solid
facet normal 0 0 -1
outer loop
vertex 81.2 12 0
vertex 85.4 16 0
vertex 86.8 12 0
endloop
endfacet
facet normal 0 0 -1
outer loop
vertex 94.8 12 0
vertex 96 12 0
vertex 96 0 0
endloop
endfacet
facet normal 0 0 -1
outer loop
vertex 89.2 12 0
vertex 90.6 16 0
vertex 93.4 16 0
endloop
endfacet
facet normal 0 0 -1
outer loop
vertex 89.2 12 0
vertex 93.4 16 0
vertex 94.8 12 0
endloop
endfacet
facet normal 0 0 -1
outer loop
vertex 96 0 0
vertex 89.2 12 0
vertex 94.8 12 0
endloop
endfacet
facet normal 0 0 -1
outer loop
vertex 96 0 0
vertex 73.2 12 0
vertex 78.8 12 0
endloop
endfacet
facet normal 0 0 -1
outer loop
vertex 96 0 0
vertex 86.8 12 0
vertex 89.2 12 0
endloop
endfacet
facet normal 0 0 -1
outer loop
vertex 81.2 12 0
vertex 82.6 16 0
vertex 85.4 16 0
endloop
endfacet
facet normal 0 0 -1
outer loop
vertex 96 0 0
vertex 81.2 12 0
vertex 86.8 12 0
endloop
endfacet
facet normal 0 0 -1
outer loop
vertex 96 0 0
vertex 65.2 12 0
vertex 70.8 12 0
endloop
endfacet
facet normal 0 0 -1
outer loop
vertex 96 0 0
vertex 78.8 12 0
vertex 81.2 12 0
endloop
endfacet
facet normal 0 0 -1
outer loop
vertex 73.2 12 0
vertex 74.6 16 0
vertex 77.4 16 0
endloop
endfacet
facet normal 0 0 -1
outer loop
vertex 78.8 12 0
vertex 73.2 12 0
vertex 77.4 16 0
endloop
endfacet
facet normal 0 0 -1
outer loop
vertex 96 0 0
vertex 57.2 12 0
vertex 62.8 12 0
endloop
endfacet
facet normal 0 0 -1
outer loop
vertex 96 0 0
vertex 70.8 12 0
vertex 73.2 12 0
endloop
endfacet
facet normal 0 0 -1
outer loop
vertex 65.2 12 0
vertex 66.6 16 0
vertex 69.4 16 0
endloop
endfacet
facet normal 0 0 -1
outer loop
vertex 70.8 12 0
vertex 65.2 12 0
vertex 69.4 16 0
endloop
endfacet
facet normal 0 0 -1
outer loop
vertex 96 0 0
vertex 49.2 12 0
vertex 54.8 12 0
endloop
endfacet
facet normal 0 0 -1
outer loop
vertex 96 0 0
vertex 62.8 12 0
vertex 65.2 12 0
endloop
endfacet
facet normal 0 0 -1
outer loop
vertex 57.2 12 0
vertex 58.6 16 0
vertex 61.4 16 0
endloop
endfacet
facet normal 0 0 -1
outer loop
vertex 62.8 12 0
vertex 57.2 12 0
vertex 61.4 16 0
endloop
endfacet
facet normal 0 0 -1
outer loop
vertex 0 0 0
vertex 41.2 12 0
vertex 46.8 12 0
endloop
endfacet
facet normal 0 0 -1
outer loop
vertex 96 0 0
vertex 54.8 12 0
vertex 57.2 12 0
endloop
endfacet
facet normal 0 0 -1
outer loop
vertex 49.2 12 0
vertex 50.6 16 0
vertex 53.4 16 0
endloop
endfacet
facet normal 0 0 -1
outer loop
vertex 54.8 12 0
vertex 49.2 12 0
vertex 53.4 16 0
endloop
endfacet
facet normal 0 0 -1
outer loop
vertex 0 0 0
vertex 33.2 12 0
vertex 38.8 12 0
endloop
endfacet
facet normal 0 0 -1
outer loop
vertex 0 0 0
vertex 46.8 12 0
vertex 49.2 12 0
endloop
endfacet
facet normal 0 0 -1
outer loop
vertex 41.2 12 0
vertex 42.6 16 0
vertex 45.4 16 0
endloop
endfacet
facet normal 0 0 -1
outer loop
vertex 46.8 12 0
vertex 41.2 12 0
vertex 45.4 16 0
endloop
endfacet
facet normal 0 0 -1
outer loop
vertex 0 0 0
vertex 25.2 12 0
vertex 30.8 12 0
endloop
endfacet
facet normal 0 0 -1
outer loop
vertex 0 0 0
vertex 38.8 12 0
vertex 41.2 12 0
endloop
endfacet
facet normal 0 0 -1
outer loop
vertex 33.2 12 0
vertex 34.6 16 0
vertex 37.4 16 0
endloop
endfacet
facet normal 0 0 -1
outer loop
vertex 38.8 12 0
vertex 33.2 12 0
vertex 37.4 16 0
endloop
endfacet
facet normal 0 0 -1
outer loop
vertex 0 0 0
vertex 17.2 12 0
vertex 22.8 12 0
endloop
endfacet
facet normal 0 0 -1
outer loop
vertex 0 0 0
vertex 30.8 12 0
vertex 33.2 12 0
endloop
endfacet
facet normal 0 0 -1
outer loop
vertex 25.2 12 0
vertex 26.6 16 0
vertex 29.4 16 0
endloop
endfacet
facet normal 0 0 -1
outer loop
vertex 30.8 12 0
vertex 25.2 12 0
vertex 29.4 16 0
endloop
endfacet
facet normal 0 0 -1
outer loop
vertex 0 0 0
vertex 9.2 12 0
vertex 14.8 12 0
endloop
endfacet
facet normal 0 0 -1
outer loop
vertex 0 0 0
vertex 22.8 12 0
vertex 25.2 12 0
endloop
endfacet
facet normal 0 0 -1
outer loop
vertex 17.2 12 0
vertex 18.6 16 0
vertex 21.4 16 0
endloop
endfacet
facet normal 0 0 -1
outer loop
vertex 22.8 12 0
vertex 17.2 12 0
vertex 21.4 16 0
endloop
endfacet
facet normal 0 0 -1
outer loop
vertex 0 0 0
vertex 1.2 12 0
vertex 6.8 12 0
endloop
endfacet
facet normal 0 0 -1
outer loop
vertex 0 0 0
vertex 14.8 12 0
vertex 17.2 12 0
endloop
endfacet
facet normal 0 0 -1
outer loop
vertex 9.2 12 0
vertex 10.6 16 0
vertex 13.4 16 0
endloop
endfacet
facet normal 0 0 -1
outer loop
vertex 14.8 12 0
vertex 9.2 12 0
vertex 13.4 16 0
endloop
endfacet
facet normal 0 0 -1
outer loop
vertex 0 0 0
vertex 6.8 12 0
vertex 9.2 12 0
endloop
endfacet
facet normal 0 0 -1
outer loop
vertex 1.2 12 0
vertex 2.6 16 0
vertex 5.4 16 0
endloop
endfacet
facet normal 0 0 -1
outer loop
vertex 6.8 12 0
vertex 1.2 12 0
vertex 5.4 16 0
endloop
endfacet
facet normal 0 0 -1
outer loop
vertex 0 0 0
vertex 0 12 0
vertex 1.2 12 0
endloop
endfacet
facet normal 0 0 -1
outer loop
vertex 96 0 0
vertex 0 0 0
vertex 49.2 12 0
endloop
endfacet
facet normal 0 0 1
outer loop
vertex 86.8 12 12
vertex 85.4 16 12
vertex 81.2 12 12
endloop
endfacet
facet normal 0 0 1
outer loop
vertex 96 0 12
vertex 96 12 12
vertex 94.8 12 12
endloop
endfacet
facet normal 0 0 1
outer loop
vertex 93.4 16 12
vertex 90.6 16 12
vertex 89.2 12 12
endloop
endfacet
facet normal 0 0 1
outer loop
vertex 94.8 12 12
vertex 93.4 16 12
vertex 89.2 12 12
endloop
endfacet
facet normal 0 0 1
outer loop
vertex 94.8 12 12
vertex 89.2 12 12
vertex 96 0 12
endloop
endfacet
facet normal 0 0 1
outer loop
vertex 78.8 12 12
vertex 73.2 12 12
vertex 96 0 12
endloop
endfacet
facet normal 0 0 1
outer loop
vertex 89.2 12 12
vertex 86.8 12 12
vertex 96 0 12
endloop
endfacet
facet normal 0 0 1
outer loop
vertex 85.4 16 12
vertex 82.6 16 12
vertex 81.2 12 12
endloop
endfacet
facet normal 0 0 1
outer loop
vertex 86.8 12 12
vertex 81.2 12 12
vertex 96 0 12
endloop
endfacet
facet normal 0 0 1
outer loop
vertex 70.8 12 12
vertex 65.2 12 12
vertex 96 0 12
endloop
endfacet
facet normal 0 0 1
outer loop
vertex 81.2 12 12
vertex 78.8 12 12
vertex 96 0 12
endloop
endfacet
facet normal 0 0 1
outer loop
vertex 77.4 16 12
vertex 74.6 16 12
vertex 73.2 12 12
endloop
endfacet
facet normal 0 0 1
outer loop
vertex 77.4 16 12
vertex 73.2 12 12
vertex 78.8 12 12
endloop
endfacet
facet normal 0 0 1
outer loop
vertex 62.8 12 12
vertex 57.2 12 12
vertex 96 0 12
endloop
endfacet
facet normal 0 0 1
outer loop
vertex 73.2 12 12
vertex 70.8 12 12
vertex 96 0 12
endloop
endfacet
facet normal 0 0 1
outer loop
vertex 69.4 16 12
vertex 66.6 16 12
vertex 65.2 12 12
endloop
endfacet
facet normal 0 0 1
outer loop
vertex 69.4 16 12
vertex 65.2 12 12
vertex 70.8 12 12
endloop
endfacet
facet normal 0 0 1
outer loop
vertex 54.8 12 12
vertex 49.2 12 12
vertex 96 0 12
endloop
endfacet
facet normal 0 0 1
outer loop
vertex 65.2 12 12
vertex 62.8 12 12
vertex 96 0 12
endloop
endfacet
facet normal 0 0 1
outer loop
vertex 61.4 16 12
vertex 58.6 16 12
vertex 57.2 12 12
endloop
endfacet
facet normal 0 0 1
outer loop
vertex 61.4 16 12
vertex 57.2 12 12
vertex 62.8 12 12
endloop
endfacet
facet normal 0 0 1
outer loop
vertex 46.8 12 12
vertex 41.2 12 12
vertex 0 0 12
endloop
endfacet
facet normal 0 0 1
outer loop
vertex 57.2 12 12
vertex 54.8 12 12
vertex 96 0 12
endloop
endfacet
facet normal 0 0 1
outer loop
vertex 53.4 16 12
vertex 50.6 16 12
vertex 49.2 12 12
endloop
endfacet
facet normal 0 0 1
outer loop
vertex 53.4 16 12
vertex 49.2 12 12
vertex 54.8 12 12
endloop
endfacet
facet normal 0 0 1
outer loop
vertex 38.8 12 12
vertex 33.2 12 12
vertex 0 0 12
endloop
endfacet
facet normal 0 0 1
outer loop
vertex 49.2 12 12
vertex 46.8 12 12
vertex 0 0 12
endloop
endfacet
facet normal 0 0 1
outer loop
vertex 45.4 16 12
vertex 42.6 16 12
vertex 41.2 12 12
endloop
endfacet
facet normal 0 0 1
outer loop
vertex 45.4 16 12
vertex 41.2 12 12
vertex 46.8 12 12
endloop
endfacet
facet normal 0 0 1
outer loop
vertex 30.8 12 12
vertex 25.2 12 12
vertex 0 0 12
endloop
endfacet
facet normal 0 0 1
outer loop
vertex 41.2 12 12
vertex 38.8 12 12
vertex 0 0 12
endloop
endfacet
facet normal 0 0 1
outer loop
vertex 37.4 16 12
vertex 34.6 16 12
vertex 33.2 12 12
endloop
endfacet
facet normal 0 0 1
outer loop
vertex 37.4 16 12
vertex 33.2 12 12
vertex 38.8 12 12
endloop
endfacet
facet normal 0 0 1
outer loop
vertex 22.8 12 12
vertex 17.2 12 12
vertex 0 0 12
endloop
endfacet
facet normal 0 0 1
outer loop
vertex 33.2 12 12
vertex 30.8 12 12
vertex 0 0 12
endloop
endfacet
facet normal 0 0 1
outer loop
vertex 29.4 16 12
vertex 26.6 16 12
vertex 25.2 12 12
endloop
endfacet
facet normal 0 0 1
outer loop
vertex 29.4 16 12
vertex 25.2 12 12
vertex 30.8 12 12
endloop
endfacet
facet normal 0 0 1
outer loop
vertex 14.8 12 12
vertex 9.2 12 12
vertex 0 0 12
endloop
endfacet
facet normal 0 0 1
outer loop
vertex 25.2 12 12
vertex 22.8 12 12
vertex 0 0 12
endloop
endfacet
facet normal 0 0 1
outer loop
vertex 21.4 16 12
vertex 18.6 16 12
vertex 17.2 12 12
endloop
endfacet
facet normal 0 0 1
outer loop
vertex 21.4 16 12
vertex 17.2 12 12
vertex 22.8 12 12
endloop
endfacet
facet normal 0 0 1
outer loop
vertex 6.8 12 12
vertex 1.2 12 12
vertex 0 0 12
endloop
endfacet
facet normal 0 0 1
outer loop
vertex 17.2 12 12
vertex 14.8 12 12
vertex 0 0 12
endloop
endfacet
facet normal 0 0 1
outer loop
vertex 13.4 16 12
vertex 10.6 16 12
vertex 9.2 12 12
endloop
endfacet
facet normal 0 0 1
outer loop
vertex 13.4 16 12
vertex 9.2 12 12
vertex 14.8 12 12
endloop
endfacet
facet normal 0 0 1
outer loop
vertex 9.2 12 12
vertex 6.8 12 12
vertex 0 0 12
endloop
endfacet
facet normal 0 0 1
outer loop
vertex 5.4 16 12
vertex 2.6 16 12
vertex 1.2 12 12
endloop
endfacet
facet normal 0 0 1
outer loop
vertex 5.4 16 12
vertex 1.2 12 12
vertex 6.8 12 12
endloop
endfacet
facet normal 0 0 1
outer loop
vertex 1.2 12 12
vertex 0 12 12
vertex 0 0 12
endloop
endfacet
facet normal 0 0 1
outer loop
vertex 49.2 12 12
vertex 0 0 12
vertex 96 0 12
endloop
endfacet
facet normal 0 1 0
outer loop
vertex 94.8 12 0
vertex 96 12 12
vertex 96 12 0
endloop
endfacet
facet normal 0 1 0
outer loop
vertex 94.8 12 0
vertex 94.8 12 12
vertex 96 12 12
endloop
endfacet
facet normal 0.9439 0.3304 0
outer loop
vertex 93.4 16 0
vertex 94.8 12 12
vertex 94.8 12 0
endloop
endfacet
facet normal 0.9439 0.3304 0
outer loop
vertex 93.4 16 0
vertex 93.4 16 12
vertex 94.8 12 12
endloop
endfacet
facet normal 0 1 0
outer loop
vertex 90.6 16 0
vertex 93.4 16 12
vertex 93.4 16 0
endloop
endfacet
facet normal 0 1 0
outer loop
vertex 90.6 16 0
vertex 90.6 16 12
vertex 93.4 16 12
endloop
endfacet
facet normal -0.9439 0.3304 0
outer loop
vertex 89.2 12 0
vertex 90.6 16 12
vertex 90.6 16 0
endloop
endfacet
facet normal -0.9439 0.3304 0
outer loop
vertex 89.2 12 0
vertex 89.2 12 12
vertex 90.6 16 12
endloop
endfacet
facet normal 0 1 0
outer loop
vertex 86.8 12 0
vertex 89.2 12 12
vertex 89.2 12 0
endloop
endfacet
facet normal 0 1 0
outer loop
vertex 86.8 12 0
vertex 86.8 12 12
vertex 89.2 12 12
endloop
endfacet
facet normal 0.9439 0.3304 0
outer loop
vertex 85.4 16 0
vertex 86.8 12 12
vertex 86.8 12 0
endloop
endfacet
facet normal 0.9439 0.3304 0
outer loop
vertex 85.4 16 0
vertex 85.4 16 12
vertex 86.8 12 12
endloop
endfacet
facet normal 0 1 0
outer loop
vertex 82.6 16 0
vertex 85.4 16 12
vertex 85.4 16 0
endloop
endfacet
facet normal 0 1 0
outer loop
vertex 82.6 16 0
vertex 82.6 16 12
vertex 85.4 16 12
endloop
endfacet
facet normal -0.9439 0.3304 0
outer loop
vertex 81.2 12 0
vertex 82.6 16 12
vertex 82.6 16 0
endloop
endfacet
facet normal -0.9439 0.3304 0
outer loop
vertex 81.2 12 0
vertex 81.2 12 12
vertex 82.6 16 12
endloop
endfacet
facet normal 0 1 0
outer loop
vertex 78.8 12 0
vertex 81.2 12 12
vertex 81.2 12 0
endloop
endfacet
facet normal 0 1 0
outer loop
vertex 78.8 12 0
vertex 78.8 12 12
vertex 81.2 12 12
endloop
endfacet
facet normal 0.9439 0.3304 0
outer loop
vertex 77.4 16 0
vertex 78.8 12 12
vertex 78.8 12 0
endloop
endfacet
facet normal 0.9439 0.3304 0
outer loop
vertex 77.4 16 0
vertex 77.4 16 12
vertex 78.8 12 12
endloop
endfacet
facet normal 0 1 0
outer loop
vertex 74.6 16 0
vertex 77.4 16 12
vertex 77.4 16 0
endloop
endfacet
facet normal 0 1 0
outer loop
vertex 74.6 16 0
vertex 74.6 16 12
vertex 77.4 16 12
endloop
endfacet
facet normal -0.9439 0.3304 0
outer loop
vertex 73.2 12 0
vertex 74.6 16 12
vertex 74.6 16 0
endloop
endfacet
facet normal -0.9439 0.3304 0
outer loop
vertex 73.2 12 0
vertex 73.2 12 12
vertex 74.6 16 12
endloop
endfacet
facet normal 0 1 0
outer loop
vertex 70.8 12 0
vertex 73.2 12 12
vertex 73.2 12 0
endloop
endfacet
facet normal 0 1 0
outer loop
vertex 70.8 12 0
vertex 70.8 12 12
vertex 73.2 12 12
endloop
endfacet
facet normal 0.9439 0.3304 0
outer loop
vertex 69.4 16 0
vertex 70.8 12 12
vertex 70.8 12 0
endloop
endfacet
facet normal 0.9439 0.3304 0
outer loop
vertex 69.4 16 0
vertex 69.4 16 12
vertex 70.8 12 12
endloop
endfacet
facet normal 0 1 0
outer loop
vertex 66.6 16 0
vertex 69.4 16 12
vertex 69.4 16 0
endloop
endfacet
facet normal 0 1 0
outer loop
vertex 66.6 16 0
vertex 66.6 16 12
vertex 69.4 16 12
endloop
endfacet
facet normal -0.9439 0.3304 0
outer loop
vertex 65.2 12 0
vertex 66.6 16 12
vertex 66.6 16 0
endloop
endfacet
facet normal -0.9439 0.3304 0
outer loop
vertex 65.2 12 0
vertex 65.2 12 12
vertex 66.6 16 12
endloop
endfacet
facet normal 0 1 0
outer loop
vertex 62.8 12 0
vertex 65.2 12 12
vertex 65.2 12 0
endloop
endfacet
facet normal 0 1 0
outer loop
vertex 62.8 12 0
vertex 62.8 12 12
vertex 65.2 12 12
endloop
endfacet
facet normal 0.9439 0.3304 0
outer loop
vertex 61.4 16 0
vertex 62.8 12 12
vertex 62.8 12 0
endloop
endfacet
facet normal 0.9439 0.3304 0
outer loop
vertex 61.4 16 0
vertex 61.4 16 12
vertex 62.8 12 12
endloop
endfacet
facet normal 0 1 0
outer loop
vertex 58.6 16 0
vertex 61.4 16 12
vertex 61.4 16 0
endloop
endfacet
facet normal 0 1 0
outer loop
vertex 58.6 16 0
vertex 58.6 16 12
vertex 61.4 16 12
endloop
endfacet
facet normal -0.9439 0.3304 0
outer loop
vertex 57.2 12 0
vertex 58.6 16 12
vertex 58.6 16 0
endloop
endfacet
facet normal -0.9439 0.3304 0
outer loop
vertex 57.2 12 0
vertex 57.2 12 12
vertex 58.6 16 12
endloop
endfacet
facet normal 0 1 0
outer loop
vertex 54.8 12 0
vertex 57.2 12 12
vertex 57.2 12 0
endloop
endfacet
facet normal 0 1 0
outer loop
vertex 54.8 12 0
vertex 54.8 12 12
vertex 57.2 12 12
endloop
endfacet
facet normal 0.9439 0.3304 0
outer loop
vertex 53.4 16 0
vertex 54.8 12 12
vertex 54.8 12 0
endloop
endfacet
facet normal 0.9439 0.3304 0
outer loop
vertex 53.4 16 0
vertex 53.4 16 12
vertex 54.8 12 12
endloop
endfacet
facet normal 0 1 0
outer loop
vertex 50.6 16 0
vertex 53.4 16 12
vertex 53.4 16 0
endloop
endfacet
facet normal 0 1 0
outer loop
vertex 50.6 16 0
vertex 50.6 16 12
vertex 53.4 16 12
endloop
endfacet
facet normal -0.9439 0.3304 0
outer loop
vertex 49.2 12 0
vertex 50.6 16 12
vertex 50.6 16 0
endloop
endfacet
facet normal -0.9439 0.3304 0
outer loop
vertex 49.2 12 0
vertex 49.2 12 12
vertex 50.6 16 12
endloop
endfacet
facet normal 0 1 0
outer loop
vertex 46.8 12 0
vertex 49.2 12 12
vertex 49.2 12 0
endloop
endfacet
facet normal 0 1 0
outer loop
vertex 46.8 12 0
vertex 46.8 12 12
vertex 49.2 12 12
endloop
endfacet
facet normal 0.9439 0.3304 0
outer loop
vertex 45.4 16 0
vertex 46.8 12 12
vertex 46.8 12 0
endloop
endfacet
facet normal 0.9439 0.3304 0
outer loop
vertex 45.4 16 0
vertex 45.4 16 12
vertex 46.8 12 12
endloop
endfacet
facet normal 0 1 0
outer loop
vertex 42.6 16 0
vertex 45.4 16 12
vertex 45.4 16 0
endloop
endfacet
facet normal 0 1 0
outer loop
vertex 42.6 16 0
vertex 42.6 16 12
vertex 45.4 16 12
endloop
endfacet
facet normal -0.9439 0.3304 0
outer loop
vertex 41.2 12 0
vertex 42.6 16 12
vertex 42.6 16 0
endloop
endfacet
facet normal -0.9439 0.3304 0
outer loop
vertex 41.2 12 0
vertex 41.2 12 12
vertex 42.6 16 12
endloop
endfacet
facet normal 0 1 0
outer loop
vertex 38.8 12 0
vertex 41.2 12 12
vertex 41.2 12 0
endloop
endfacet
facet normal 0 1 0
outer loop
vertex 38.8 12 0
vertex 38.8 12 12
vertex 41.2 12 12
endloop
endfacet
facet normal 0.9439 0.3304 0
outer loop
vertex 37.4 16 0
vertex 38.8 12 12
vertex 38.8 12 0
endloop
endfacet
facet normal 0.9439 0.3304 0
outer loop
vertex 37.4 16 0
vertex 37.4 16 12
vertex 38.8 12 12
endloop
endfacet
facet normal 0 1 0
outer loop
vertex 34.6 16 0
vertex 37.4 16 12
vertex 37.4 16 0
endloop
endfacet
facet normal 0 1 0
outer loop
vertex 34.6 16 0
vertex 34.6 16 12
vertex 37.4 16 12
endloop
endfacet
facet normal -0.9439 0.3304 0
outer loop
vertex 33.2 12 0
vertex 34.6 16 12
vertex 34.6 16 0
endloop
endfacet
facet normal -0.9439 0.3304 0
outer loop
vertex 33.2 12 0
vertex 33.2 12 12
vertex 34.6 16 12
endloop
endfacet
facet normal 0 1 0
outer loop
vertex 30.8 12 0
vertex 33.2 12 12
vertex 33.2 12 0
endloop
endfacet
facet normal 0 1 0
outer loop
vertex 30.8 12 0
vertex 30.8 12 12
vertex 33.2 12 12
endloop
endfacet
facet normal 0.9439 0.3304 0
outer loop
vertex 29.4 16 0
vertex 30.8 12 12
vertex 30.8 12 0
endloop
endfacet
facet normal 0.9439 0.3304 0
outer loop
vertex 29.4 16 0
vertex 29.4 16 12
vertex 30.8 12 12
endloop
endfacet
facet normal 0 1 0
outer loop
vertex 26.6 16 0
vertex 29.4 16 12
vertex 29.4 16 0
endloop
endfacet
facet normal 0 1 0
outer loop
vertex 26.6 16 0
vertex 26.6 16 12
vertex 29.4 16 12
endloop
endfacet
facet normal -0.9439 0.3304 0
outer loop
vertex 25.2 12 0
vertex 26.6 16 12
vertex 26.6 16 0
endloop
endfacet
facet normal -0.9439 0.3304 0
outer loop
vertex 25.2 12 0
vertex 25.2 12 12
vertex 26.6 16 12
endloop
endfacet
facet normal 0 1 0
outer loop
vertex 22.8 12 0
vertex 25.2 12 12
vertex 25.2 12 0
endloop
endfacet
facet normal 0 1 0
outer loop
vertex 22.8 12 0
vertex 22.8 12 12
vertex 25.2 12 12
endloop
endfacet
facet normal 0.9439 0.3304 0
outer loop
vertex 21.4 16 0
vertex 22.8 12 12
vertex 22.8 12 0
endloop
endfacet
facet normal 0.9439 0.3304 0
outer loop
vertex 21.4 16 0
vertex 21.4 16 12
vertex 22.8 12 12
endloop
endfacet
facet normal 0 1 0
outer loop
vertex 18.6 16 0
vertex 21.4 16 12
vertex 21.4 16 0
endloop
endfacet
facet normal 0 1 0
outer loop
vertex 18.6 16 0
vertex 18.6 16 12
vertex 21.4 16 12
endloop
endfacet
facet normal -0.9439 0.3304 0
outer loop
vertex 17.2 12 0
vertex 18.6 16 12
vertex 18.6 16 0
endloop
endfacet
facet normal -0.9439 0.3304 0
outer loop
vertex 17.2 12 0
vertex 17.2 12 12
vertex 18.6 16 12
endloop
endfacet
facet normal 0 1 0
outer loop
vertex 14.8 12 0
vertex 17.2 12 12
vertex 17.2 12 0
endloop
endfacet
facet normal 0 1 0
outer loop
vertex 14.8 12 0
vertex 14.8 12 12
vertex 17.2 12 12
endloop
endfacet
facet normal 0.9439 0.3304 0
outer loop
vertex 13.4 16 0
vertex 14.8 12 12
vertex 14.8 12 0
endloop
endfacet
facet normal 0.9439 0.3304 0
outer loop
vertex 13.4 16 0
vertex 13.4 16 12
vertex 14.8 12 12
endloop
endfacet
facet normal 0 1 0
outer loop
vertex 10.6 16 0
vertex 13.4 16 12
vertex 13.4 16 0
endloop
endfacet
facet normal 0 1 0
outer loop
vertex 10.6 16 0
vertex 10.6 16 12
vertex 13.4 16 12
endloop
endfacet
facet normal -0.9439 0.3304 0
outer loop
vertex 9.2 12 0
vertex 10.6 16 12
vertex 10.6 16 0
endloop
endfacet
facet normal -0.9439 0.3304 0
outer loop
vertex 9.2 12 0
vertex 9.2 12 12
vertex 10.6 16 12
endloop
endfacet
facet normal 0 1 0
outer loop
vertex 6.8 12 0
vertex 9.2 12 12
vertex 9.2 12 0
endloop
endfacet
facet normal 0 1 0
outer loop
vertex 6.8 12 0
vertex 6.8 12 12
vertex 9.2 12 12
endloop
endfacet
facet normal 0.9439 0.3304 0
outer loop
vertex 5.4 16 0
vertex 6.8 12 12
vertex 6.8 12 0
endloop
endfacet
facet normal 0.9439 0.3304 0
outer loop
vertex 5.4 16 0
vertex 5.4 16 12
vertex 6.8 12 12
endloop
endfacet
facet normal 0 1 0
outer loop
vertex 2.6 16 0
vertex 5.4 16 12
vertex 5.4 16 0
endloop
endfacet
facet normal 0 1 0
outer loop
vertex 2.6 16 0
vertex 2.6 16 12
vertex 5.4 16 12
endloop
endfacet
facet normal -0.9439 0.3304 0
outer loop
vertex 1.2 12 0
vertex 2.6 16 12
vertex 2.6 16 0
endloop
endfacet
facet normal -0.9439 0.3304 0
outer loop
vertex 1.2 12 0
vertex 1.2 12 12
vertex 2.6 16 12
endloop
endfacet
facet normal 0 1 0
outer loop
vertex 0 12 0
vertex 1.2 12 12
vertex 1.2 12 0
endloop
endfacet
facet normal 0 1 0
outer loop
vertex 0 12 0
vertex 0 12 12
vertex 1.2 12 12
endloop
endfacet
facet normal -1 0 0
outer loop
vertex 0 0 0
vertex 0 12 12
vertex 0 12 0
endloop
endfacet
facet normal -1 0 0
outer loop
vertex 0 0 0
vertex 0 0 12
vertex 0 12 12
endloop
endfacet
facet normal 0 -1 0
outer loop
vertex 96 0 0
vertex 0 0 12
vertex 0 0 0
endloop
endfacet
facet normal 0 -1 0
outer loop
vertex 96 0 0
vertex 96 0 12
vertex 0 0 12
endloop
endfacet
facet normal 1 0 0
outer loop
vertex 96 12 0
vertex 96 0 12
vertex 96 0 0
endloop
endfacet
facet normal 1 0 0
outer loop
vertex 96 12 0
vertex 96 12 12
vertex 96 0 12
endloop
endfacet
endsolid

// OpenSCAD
$fn = 32;

// ----------------------------------------------------------------------
// Gear rack: 12 teeth, pitch 8 mm
// ----------------------------------------------------------------------

// --- parameters (mm) ---
teeth = 12;               // number of teeth
pitch = 8;                // tooth pitch, X
root_w = 5.6;             // tooth width at the root
tip_w = 2.8;              // tooth width at the tip
base_h = 12;              // rack body height, Y
tooth_h = 4;              // tooth height above the body
plate_t = 12;             // rack width, Z (extrusion height)
fit_tol = 0.1;            // declared fit tolerance (prompt contract)
free_tol = 0.3;           // declared free tolerance (prompt contract)

rack_l = teeth * pitch;  // overall length
total_h = base_h + tooth_h;  // overall height

profile = [[0, 0], [96, 0], [96, 12], [94.8, 12], [93.4, 16], [90.6, 16], [89.2, 12], [86.8, 12], [85.4, 16], [82.6, 16], [81.2, 12], [78.8, 12], [77.4, 16], [74.6, 16], [73.2, 12], [70.8, 12], [69.4, 16], [66.6, 16], [65.2, 12], [62.8, 12], [61.4, 16], [58.6, 16], [57.2, 12], [54.8, 12], [53.4, 16], [50.6, 16], [49.2, 12], [46.8, 12], [45.4, 16], [42.6, 16], [41.2, 12], [38.8, 12], [37.4, 16], [34.6, 16], [33.2, 12], [30.8, 12], [29.4, 16], [26.6, 16], [25.2, 12], [22.8, 12], [21.4, 16], [18.6, 16], [17.2, 12], [14.8, 12], [13.4, 16], [10.6, 16], [9.2, 12], [6.8, 12], [5.4, 16], [2.6, 16], [1.2, 12], [0, 12]];  // primary outline, 52 points, counter clockwise

// --- the one profile operation ---
linear_extrude(height = plate_t) polygon(points = profile);
